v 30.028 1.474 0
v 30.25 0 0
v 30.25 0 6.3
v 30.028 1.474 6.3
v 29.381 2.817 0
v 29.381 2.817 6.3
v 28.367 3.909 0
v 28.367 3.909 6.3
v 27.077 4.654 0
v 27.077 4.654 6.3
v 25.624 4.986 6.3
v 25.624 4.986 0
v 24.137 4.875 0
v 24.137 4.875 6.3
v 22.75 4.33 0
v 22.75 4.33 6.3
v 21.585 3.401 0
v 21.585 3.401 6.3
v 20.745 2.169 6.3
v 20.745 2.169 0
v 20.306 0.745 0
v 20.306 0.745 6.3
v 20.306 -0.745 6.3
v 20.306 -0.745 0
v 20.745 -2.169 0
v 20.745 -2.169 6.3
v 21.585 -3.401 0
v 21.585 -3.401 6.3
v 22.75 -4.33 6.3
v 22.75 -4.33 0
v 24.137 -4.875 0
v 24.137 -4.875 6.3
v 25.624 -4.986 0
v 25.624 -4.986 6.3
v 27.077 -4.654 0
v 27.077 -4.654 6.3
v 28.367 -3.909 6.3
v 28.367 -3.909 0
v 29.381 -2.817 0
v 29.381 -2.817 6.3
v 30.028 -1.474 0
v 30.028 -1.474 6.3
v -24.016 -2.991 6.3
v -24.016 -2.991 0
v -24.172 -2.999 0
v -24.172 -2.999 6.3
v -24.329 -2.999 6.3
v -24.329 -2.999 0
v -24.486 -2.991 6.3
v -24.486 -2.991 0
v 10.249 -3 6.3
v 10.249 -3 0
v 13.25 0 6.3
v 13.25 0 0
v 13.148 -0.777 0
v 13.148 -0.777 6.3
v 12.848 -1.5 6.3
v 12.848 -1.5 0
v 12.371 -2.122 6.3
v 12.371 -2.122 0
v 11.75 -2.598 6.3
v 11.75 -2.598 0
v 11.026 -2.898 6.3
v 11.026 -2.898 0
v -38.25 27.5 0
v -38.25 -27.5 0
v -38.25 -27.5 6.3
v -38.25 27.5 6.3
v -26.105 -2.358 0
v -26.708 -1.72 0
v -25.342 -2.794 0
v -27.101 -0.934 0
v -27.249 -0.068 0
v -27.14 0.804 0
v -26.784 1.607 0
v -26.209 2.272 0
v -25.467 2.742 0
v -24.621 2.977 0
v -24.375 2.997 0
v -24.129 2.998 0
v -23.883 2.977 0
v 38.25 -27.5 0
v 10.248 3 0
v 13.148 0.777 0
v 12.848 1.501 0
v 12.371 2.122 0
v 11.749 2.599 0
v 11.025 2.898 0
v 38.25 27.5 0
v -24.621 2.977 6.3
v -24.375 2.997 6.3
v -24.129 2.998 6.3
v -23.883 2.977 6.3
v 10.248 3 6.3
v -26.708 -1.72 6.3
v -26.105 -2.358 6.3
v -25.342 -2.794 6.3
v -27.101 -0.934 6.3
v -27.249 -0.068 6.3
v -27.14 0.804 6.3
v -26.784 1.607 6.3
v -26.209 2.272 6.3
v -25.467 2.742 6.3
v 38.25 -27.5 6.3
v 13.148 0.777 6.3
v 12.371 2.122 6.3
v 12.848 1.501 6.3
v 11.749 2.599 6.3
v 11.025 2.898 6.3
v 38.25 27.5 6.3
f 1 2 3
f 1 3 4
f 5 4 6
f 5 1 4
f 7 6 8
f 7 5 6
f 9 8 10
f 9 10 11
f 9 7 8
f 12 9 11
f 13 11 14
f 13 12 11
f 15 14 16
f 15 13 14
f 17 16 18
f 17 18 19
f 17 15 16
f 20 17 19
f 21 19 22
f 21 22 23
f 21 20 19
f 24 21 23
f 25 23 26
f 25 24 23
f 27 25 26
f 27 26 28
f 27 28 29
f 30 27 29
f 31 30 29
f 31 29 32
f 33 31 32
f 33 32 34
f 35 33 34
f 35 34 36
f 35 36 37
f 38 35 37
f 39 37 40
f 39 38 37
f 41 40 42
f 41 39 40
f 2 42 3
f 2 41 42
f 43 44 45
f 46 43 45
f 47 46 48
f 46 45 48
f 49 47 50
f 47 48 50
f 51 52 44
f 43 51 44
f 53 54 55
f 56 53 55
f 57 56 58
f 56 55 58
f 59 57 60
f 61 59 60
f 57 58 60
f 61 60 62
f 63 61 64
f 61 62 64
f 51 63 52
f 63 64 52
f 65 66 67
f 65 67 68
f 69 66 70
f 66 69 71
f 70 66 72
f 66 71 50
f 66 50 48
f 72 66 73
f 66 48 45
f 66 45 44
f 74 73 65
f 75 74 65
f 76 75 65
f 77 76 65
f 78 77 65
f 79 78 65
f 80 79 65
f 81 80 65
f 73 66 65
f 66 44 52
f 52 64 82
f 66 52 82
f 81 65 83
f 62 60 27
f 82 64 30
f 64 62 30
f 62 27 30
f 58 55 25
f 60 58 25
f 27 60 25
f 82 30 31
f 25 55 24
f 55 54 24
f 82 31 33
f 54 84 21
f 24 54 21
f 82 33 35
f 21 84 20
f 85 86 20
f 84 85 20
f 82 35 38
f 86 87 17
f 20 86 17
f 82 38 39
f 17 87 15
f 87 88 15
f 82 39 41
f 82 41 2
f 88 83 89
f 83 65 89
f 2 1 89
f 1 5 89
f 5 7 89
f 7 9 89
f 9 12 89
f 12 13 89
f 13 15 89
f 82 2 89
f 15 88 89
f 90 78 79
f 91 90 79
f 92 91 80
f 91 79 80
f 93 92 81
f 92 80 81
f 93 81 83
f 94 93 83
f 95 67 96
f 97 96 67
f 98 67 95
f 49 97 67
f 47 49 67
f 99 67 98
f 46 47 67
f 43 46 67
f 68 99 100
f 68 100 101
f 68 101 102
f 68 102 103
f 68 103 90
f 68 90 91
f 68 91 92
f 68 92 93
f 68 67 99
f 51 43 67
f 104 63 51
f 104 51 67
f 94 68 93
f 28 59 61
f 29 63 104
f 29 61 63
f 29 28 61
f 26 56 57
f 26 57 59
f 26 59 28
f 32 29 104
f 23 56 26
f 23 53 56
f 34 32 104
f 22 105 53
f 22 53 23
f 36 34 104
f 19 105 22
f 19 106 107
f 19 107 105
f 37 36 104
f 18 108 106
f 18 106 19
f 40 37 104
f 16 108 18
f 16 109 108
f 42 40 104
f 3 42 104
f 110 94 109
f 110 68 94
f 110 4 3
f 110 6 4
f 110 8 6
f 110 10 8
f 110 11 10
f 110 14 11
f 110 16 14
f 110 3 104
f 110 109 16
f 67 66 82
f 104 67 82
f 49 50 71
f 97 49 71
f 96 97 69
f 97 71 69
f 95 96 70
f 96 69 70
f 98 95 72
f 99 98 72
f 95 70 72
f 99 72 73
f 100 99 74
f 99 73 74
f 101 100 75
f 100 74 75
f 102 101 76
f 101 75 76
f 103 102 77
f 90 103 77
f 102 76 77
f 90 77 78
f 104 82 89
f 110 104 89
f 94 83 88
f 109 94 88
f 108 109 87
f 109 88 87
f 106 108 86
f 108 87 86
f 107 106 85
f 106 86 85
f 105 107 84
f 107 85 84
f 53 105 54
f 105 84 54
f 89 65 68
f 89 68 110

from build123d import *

# Parameters (mm, degrees)
F0_W     = 76.5
F0_H     = 55
F0_R     = 5
F1_DEPTH = 6.3


with BuildPart() as f1:
    # F0 (on Top) → F1 (new body)
    with BuildSketch(Plane.XY):
        Rectangle(F0_W, F0_H)
        with BuildLine():
            ThreePointArc((10.248019, 2.999999), (12.37062, 2.12202), (13.25, 0))
            ThreePointArc((13.25, 0), (12.371037, -2.121604), (10.249198, -3))
            Line((10.249198, -3), (-24.015752, -2.990841))
            ThreePointArc((-24.015752, -2.990841), (-24.250802, -3), (-24.485847, -2.990715))
            ThreePointArc((-24.485847, -2.990715), (-27.249231, -0.067905), (-24.620961, 2.976976))
            ThreePointArc((-24.620961, 2.976976), (-24.251981, 2.999999), (-23.882971, 2.977464))
            Line((-23.882971, 2.977464), (10.248019, 2.999999))
        make_face(mode=Mode.SUBTRACT)
        with Locations((25.25, 0)):
            Circle(F0_R, mode=Mode.SUBTRACT)
    extrude(amount=F1_DEPTH)


solid = f1.part
